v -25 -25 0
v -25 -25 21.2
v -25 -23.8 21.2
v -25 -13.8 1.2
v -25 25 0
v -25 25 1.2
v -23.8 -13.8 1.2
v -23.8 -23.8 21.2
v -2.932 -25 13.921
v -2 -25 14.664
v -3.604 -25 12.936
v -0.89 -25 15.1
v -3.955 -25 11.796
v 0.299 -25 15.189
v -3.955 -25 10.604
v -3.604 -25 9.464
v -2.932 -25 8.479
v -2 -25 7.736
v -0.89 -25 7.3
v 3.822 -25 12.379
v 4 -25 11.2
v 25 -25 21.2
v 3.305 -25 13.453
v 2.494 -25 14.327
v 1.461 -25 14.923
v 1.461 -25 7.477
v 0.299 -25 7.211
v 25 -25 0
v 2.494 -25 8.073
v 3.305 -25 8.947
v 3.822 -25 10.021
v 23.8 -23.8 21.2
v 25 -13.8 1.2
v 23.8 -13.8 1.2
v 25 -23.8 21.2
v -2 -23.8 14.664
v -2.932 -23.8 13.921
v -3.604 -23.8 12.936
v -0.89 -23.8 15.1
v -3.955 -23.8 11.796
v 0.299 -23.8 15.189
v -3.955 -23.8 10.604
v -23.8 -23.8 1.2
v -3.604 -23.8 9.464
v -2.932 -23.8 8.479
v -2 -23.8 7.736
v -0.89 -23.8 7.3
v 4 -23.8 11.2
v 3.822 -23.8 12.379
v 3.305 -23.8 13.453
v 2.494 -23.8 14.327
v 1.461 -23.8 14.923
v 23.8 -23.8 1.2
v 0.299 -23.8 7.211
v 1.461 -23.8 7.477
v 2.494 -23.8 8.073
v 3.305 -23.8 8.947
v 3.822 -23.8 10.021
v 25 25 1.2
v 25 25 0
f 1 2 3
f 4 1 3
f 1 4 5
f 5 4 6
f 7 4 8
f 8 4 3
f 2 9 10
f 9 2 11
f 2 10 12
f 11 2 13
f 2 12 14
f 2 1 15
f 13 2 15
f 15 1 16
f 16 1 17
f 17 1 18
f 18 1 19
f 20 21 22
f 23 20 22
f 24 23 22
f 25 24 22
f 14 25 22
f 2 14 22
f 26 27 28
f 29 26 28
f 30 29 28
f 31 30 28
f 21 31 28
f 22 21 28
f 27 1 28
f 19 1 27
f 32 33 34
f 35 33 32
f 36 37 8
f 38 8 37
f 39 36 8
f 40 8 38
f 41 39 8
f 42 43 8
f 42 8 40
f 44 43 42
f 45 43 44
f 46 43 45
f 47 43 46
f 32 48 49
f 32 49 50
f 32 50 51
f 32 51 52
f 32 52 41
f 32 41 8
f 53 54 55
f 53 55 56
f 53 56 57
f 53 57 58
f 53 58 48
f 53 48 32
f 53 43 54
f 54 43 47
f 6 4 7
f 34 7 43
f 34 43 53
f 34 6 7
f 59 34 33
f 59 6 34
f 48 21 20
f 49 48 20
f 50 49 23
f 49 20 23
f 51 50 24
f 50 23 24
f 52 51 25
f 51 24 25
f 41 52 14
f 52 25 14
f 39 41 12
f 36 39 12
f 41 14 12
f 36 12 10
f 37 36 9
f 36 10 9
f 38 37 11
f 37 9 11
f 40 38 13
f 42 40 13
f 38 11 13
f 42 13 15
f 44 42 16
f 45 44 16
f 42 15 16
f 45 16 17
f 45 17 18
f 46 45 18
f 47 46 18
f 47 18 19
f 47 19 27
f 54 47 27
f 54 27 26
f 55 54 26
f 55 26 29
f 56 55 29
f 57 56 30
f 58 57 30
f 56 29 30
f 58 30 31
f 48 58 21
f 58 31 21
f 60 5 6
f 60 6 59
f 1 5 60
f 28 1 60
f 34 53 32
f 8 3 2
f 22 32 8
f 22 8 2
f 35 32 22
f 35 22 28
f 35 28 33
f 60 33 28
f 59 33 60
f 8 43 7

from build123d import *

# Parameters (mm, degrees)
SKETCH_W     = 50
SKETCH_H     = 50
PAD_DEPTH    = 1.2
SKETCH001_W  = 50
SKETCH001_H  = 1.2
PAD001_DEPTH = 20
PAD002_DEPTH = 1.2
PAD003_DEPTH = 1.2
SKETCH004_R  = 4
POCKET_DEPTH = 1.2


with BuildPart() as part:
    # Sketch → Pad (new body)
    with BuildSketch(Plane.XY):
        Rectangle(SKETCH_W, SKETCH_H)
    extrude(amount=PAD_DEPTH)

    # Sketch001 (on Face6 of Pad) → Pad001 (join)
    with BuildSketch(Plane.XY.offset(1.2)):
        with Locations((0, -24.4)):
            Rectangle(SKETCH001_W, SKETCH001_H)
    extrude(amount=PAD001_DEPTH)

    # Sketch002 (on Face7 of Pad001) → Pad002 (join)
    with BuildSketch(Plane(origin=(-25, 0, 0), x_dir=(0, -1, 0), z_dir=(-1, 0, 0))):
        Polygon((23.8, 21.2), (23.8, 1.2), (13.8, 1.2), align=None)
    extrude(amount=-PAD002_DEPTH)

    # Sketch003 (on Face1 of Pad002) → Pad003 (join)
    with BuildSketch(Plane.YZ.offset(25)):
        Polygon((-23.8, 21.2), (-23.8, 1.2), (-13.8, 1.2), align=None)
    extrude(amount=-PAD003_DEPTH)

    # Sketch004 (on Face9 of Pad003) → Pocket (cut)
    with BuildSketch(Plane.XZ.offset(25)):
        with Locations((0, 11.2)):
            Circle(SKETCH004_R)
    extrude(amount=-POCKET_DEPTH, mode=Mode.SUBTRACT)


solid = part.part
